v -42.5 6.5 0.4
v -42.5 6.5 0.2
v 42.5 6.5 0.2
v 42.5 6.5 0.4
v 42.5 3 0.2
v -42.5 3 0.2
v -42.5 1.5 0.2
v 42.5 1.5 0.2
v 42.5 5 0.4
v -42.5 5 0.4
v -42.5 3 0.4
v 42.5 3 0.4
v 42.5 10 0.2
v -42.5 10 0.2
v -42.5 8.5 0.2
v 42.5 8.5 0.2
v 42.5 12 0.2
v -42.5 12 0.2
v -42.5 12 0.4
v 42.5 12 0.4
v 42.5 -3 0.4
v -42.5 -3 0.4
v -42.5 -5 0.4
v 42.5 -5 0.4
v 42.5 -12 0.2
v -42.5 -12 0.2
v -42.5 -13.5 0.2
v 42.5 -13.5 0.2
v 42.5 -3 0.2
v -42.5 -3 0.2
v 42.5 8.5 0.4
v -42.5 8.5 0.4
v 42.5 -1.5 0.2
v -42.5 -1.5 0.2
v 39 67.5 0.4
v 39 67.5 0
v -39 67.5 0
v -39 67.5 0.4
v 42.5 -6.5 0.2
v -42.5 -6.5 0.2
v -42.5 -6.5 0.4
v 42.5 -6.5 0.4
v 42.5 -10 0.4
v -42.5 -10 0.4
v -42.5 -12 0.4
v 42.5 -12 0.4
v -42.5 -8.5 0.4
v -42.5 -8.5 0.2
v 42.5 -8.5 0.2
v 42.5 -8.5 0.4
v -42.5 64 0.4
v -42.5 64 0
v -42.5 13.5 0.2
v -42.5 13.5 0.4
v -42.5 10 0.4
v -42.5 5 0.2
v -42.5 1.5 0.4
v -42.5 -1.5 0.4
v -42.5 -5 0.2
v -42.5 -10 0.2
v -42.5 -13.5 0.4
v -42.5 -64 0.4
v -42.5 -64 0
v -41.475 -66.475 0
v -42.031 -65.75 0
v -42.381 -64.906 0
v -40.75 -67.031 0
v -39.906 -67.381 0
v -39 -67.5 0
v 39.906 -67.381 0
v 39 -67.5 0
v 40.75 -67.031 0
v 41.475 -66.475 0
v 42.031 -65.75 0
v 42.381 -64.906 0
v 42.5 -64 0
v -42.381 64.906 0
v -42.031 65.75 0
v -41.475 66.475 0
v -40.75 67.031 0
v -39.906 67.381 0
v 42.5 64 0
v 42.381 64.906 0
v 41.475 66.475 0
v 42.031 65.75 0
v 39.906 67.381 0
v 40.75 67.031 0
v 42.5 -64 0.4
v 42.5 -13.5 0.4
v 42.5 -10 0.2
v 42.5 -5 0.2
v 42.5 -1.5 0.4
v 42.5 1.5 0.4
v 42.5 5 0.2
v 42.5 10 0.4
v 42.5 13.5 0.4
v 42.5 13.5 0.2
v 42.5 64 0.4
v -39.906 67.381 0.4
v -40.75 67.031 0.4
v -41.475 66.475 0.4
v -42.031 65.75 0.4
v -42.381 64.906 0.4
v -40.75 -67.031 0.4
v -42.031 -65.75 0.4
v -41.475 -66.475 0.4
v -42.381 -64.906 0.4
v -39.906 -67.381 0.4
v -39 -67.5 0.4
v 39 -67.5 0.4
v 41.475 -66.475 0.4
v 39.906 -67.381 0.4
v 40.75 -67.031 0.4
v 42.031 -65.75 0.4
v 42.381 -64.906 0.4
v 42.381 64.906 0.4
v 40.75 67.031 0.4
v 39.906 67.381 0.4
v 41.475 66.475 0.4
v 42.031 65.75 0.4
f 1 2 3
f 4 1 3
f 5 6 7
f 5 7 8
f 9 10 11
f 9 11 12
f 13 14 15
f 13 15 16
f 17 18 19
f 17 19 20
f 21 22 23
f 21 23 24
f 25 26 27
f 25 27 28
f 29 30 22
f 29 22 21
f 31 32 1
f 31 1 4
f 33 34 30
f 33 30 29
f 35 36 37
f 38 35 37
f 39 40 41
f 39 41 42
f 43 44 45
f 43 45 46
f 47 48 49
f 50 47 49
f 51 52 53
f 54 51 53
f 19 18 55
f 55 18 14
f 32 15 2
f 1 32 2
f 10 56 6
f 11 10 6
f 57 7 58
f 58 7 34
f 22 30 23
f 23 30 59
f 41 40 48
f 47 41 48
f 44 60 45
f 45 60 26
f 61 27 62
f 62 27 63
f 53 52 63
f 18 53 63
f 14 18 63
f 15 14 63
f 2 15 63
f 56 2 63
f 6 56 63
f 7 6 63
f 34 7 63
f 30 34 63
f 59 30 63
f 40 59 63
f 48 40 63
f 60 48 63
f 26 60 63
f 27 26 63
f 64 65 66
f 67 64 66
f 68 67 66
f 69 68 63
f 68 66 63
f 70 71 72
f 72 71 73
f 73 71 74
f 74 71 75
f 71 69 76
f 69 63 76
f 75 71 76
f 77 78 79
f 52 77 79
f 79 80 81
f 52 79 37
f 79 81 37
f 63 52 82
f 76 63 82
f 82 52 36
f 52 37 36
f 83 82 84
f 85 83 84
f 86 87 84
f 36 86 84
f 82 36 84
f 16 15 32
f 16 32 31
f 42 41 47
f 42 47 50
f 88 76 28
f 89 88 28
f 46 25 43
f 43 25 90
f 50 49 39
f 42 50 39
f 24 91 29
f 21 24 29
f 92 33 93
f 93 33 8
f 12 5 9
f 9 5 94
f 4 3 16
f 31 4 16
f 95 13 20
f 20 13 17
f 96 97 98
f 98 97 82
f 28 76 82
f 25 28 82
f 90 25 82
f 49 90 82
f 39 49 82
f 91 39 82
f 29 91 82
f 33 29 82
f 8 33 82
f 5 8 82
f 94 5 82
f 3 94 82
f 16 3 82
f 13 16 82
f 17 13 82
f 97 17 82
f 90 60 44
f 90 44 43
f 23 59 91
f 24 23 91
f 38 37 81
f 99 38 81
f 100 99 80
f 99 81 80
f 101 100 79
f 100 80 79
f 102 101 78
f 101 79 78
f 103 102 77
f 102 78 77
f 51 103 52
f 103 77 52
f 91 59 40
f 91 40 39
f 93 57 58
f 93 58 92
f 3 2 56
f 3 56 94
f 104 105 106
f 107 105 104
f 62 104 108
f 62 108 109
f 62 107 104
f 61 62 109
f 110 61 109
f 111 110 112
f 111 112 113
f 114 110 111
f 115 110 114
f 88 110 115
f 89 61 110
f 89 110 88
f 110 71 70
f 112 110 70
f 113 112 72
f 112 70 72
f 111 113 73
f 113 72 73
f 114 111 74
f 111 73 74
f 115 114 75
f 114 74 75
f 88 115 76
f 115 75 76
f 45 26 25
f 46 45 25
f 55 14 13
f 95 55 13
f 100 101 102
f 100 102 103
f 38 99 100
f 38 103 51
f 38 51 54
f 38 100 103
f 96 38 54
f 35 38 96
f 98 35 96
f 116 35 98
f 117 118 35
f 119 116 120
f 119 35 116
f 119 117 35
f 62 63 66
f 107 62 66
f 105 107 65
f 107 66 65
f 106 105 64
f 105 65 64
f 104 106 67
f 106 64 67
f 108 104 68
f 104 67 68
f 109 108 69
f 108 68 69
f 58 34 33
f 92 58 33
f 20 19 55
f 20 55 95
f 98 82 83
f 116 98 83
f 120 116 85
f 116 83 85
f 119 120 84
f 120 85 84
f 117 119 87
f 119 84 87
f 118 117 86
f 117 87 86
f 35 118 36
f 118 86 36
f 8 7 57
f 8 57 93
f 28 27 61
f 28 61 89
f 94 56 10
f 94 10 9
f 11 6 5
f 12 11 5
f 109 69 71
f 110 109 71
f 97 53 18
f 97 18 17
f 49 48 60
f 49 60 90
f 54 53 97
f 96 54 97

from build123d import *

# Parameters (mm, degrees)
F1_DEPTH = 0.2
F3_DEPTH = 0.4
F2_W     = 85
F2_H     = 1.5
F4_DEPTH = 0.2


with BuildPart() as f1:
    # F0 (on Top) → F1 (new body)
    with BuildSketch(Plane.XY):
        with BuildLine():
            ThreePointArc((42.5, 64), (41.474874, 66.474874), (39, 67.5))
            Line((39, 67.5), (-39, 67.5))
            ThreePointArc((-39, 67.5), (-41.474874, 66.474874), (-42.5, 64))
            Line((-42.5, 64), (-42.5, -64))
            ThreePointArc((-42.5, -64), (-41.474874, -66.474874), (-39, -67.5))
            Line((-39, -67.5), (39, -67.5))
            ThreePointArc((39, -67.5), (41.474874, -66.474874), (42.5, -64))
            Line((42.5, -64), (42.5, 64))
        make_face()
    extrude(amount=F1_DEPTH)

    # F0 (on Top) → F3 (join)
    with BuildSketch(Plane.XY):
        with BuildLine():
            ThreePointArc((42.5, 64), (41.474874, 66.474874), (39, 67.5))
            Line((39, 67.5), (-39, 67.5))
            ThreePointArc((-39, 67.5), (-41.474874, 66.474874), (-42.5, 64))
            Line((-42.5, 64), (-42.5, -64))
            ThreePointArc((-42.5, -64), (-41.474874, -66.474874), (-39, -67.5))
            Line((-39, -67.5), (39, -67.5))
            ThreePointArc((39, -67.5), (41.474874, -66.474874), (42.5, -64))
            Line((42.5, -64), (42.5, 64))
        make_face()
    extrude(amount=F3_DEPTH)

    # F2 (on face) → F4 (cut, through all)
    with BuildSketch(Plane.XY.offset(0.2)):
        with Locations((0, 12.75)):
            Rectangle(F2_W, F2_H)
        with Locations((0, 9.25)):
            Rectangle(F2_W, F2_H)
        with Locations((0, 5.75)):
            Rectangle(F2_W, F2_H)
        with Locations((0, -12.75)):
            Rectangle(F2_W, F2_H)
        with Locations((0, -9.25)):
            Rectangle(F2_W, F2_H)
        with Locations((0, -5.75)):
            Rectangle(F2_W, F2_H)
        with Locations((0, 2.25)):
            Rectangle(F2_W, F2_H)
        with Locations((0, -2.25)):
            Rectangle(F2_W, F2_H)
    extrude(amount=F4_DEPTH, mode=Mode.SUBTRACT)


solid = f1.part
